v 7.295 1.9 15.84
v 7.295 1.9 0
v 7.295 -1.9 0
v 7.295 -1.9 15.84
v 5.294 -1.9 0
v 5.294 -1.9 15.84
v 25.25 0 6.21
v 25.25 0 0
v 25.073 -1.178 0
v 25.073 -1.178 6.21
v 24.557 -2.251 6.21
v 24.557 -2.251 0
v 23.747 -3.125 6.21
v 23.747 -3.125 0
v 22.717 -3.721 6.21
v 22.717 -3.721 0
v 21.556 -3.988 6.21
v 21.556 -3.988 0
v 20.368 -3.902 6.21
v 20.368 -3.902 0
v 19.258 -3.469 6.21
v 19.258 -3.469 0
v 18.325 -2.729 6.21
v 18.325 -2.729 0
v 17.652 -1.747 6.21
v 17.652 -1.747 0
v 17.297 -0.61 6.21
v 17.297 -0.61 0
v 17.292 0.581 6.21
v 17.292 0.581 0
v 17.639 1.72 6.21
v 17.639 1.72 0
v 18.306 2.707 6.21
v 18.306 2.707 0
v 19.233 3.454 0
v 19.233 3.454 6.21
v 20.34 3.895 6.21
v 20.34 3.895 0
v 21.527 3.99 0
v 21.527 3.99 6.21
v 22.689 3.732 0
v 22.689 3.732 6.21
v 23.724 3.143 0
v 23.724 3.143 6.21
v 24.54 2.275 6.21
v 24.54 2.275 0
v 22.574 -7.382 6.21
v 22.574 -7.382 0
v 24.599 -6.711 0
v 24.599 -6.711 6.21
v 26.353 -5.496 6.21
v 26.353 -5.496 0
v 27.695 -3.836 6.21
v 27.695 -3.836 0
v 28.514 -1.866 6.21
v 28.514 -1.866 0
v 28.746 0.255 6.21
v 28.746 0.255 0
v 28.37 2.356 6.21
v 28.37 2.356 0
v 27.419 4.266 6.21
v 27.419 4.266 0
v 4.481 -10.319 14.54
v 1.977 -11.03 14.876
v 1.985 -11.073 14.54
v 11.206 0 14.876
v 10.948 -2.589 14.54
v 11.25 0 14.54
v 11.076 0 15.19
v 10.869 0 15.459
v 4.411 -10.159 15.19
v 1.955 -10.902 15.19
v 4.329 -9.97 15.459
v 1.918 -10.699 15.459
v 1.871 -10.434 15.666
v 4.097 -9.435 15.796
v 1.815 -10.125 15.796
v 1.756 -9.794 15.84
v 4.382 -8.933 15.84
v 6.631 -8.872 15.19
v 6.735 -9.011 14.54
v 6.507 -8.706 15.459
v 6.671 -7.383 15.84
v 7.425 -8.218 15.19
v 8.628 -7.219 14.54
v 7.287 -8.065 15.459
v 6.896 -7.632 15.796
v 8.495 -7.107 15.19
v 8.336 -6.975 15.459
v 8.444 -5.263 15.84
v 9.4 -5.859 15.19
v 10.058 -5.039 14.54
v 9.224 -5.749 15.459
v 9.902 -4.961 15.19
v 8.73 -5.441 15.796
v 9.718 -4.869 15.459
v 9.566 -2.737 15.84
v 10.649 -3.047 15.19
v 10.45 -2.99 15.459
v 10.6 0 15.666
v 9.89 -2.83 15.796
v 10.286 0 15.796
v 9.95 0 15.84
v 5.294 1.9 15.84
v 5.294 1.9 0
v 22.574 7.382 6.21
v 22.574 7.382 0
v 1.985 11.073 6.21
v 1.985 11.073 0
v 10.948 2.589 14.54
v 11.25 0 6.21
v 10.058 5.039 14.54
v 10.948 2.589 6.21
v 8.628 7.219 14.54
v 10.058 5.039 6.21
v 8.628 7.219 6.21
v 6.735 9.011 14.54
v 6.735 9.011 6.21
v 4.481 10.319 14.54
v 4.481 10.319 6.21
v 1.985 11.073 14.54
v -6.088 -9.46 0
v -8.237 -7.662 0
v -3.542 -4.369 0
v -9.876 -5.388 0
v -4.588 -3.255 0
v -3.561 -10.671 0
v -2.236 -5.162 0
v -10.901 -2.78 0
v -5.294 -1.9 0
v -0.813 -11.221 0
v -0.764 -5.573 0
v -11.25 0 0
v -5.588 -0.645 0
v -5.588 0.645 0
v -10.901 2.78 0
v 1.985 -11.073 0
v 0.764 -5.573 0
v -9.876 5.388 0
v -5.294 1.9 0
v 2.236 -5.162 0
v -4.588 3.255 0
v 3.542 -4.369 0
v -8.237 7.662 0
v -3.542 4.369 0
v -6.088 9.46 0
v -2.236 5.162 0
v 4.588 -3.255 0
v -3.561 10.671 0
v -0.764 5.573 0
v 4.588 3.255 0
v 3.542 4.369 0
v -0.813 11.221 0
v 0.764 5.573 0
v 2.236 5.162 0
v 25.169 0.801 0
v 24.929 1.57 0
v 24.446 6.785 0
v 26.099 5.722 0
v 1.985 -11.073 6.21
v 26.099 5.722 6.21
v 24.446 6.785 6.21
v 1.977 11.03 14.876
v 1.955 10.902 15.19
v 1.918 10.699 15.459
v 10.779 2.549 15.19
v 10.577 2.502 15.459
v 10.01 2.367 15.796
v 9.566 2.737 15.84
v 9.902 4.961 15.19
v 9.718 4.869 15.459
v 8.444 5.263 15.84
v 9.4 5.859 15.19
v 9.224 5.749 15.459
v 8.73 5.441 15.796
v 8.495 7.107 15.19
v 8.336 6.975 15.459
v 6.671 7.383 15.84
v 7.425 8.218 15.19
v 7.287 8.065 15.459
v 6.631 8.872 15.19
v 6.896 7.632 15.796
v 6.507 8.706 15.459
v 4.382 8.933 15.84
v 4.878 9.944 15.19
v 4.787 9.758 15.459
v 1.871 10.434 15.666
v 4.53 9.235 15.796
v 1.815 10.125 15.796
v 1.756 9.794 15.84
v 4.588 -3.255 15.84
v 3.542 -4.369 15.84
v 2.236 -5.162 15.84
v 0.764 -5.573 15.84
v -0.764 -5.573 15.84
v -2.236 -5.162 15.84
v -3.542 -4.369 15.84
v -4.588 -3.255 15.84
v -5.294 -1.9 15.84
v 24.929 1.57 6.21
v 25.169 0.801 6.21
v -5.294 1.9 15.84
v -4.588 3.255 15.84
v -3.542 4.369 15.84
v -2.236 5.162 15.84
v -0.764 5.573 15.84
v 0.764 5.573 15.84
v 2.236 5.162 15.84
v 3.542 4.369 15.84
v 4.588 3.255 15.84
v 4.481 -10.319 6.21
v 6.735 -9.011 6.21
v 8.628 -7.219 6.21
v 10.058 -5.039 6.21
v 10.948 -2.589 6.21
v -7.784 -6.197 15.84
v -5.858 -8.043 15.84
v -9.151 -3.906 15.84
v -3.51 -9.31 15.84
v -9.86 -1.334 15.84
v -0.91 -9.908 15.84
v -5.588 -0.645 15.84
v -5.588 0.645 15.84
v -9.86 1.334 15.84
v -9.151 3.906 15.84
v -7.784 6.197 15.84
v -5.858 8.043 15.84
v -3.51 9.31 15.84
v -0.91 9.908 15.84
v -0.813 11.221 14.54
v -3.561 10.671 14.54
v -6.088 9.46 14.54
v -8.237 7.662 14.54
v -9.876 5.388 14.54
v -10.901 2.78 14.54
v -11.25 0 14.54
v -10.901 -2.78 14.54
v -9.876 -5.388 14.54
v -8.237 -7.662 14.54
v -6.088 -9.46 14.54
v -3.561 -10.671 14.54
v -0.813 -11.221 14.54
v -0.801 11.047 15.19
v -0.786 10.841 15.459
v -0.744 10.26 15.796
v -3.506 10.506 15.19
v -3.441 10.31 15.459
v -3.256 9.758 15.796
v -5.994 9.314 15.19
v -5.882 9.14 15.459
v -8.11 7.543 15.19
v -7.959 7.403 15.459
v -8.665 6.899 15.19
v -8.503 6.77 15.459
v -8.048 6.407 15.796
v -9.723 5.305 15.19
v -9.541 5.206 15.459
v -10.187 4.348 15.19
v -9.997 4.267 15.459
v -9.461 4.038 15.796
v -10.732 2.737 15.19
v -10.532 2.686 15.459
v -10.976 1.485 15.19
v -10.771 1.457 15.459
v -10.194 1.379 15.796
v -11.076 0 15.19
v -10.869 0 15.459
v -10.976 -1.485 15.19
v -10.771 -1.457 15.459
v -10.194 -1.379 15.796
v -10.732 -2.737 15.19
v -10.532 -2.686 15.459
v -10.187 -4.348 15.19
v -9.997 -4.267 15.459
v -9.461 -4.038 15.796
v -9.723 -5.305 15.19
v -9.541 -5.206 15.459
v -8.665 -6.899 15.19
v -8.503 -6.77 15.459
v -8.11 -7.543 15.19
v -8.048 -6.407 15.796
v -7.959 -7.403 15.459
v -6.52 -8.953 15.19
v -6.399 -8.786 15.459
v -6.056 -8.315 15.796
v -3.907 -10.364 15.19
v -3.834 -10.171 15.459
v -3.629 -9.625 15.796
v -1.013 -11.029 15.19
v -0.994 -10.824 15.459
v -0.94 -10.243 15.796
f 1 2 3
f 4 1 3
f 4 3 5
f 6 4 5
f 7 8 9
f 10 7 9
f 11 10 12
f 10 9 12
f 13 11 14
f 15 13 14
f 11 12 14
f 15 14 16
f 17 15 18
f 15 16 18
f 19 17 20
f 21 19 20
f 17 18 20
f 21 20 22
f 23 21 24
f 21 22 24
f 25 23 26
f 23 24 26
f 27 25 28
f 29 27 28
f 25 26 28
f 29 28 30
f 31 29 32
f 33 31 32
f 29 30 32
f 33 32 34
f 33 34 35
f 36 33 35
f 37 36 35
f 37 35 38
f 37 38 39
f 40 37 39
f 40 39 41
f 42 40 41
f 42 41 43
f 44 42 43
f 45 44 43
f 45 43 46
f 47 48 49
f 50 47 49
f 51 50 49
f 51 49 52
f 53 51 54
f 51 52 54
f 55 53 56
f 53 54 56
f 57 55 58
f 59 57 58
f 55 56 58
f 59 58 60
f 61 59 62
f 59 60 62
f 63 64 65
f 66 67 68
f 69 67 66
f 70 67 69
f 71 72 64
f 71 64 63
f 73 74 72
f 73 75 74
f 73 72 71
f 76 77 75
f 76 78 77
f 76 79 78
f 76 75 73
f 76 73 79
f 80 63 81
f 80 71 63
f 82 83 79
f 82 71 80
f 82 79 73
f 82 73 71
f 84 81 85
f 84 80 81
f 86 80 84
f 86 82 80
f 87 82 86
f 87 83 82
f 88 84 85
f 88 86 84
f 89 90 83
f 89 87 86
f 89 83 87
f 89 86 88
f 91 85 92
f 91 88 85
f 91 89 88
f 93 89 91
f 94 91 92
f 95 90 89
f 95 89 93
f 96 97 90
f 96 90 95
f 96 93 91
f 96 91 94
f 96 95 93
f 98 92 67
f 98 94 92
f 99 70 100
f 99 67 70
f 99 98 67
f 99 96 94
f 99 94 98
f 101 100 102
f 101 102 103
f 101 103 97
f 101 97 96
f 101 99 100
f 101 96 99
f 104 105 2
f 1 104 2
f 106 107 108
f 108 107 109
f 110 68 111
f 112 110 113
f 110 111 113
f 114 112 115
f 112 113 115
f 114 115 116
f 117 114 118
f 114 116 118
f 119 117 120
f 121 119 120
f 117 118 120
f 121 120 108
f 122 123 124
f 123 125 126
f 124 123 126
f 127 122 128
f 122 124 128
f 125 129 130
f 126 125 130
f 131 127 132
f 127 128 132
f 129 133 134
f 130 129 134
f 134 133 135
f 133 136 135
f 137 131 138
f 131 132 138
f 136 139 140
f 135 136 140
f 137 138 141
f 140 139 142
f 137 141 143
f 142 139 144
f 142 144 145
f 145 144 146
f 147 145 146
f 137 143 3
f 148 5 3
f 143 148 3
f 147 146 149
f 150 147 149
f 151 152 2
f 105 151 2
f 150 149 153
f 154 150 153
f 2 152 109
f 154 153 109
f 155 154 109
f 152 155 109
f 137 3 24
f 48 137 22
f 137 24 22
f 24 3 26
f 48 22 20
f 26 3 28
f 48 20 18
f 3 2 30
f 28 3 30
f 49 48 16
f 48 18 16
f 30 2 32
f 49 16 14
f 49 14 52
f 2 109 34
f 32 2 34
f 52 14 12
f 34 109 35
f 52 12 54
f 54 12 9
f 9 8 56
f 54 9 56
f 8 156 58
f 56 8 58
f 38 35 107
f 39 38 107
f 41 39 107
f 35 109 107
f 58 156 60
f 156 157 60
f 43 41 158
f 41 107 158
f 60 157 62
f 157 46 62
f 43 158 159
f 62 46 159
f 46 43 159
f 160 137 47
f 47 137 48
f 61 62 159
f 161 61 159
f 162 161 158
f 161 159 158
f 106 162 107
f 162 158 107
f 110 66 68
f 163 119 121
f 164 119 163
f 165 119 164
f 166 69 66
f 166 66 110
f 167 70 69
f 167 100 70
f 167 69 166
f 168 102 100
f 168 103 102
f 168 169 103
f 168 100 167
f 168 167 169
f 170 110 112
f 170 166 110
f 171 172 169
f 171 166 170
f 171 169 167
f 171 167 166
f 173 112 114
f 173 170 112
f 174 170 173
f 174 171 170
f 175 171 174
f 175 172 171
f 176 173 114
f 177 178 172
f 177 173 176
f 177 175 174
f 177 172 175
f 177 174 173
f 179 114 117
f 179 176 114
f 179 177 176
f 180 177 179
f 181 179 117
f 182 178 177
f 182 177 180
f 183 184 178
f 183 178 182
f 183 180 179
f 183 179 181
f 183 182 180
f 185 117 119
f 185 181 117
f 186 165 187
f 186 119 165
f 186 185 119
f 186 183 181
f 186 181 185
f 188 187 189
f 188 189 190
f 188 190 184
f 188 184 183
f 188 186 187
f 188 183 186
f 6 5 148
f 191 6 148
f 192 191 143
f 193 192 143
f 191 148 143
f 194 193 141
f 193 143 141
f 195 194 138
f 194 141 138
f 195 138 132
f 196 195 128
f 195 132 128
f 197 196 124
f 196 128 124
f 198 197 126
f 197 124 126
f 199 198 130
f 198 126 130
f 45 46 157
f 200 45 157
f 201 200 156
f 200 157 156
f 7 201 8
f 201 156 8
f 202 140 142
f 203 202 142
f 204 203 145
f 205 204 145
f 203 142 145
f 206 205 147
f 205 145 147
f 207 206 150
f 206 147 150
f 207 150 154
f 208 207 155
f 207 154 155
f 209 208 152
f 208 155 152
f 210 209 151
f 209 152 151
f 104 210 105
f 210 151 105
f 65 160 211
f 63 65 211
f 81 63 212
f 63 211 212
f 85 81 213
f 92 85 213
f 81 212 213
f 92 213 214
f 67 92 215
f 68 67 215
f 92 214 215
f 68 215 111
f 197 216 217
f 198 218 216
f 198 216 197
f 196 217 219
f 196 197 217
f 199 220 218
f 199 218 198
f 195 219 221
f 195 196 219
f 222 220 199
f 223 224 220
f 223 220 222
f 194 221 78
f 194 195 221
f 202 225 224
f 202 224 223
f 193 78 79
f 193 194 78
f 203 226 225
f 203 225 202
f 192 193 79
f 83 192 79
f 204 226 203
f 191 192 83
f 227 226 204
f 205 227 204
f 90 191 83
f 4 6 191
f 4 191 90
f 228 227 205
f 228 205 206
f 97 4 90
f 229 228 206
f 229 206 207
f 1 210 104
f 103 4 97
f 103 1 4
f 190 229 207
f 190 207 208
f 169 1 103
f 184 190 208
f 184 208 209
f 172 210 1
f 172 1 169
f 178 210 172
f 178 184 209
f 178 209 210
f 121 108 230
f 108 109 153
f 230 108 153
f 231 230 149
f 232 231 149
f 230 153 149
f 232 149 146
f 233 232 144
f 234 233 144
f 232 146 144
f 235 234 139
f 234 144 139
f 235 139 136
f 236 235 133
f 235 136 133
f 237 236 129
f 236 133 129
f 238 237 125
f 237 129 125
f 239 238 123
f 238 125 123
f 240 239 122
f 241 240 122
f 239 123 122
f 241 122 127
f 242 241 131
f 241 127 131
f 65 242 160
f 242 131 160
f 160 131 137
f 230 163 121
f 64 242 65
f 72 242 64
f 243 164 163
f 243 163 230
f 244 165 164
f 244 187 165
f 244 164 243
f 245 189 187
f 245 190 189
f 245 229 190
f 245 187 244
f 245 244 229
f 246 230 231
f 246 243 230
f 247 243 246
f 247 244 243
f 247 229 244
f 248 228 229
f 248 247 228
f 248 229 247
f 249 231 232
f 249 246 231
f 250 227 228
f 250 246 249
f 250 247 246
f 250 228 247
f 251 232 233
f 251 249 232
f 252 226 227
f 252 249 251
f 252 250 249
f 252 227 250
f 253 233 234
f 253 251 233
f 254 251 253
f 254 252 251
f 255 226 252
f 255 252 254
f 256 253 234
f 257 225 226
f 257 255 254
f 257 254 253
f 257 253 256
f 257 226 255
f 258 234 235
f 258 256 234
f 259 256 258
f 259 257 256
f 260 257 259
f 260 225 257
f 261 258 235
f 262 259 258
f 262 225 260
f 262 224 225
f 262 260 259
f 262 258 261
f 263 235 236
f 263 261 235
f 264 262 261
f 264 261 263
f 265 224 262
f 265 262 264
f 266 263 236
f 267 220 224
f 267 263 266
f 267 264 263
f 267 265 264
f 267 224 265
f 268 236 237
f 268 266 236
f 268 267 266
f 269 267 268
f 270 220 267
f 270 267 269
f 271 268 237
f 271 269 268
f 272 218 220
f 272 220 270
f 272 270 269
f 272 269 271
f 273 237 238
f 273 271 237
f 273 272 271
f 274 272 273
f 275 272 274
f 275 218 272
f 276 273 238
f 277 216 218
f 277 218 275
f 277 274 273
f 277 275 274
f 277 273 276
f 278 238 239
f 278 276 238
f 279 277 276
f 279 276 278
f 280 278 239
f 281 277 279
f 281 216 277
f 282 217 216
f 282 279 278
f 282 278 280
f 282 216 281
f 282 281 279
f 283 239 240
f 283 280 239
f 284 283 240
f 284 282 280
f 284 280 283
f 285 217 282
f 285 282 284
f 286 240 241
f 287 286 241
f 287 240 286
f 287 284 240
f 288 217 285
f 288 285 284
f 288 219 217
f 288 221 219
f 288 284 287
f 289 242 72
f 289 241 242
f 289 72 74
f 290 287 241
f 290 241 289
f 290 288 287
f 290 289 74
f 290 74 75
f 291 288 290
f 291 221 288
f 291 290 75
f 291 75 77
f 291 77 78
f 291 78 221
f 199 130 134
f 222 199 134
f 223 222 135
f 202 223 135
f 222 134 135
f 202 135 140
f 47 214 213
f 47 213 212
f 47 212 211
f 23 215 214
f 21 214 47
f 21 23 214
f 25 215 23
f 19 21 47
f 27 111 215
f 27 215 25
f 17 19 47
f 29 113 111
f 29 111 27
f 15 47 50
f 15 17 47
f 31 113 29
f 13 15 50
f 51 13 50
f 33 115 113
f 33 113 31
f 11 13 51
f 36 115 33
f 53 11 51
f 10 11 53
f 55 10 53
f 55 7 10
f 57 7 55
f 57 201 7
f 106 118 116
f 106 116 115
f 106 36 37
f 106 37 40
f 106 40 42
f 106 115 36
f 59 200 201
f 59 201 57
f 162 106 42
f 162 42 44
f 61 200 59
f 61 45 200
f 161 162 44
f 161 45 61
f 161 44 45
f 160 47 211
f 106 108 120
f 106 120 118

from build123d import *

# Parameters (mm, degrees)
F1_DEPTH = 15.84
F2_DEPTH = 6.21
F3_R     = 1.3


with BuildPart() as f1:
    # F0 (on Top) → F1 (new body)
    with BuildSketch(Plane.XY):
        with BuildLine():
            ThreePointArc((1.985294, -11.073442), (8.628356, -7.219001), (11.25, 0))
            ThreePointArc((11.25, 0), (8.628356, 7.219001), (1.985294, 11.073442))
            ThreePointArc((1.985294, 11.073442), (-11.25, 0), (1.985294, -11.073442))
        make_face()
        with BuildLine():
            ThreePointArc((-5.294396, -1.9), (-5.625, 0), (-5.294396, 1.9))
            ThreePointArc((-5.294396, 1.9), (0, 5.625), (5.294396, 1.9))
            Line((5.294396, 1.9), (7.295, 1.9))
            Line((7.295, 1.9), (7.295, 0))
            Line((7.295, 0), (7.295, -1.9))
            Line((7.295, -1.9), (5.294396, -1.9))
            ThreePointArc((5.294396, -1.9), (0, -5.625), (-5.294396, -1.9))
        make_face(mode=Mode.SUBTRACT)
    extrude(amount=F1_DEPTH)

    # F0 (on Top) → F2 (join)
    with BuildSketch(Plane.XY):
        with BuildLine():
            ThreePointArc((1.985294, 11.073442), (8.628356, 7.219001), (11.25, 0))
            ThreePointArc((11.25, 0), (8.628356, -7.219001), (1.985294, -11.073442))
            Line((1.985294, -11.073442), (22.573529, -7.382294))
            ThreePointArc((22.573529, -7.382294), (28.174792, -2.880495), (27.418746, 4.265744))
            ThreePointArc((27.418746, 4.265744), (25.307311, 6.307791), (22.573529, 7.382294))
            Line((22.573529, 7.382294), (1.985294, 11.073442))
        make_face()
        with BuildLine():
            ThreePointArc((25.25, 0), (17.431624, -1.191639), (24.539998, 2.275063))
            ThreePointArc((24.539998, 2.275063), (25.068376, 1.191639), (25.25, 0))
        make_face(mode=Mode.SUBTRACT)
    extrude(amount=F2_DEPTH)

    # F3
    f3_edges = [f1.edges().sort_by_distance(p)[0] for p in [
        (-1.985294, 11.073442, 15.84),
    ]]
    fillet(f3_edges, radius=F3_R)


solid = f1.part
